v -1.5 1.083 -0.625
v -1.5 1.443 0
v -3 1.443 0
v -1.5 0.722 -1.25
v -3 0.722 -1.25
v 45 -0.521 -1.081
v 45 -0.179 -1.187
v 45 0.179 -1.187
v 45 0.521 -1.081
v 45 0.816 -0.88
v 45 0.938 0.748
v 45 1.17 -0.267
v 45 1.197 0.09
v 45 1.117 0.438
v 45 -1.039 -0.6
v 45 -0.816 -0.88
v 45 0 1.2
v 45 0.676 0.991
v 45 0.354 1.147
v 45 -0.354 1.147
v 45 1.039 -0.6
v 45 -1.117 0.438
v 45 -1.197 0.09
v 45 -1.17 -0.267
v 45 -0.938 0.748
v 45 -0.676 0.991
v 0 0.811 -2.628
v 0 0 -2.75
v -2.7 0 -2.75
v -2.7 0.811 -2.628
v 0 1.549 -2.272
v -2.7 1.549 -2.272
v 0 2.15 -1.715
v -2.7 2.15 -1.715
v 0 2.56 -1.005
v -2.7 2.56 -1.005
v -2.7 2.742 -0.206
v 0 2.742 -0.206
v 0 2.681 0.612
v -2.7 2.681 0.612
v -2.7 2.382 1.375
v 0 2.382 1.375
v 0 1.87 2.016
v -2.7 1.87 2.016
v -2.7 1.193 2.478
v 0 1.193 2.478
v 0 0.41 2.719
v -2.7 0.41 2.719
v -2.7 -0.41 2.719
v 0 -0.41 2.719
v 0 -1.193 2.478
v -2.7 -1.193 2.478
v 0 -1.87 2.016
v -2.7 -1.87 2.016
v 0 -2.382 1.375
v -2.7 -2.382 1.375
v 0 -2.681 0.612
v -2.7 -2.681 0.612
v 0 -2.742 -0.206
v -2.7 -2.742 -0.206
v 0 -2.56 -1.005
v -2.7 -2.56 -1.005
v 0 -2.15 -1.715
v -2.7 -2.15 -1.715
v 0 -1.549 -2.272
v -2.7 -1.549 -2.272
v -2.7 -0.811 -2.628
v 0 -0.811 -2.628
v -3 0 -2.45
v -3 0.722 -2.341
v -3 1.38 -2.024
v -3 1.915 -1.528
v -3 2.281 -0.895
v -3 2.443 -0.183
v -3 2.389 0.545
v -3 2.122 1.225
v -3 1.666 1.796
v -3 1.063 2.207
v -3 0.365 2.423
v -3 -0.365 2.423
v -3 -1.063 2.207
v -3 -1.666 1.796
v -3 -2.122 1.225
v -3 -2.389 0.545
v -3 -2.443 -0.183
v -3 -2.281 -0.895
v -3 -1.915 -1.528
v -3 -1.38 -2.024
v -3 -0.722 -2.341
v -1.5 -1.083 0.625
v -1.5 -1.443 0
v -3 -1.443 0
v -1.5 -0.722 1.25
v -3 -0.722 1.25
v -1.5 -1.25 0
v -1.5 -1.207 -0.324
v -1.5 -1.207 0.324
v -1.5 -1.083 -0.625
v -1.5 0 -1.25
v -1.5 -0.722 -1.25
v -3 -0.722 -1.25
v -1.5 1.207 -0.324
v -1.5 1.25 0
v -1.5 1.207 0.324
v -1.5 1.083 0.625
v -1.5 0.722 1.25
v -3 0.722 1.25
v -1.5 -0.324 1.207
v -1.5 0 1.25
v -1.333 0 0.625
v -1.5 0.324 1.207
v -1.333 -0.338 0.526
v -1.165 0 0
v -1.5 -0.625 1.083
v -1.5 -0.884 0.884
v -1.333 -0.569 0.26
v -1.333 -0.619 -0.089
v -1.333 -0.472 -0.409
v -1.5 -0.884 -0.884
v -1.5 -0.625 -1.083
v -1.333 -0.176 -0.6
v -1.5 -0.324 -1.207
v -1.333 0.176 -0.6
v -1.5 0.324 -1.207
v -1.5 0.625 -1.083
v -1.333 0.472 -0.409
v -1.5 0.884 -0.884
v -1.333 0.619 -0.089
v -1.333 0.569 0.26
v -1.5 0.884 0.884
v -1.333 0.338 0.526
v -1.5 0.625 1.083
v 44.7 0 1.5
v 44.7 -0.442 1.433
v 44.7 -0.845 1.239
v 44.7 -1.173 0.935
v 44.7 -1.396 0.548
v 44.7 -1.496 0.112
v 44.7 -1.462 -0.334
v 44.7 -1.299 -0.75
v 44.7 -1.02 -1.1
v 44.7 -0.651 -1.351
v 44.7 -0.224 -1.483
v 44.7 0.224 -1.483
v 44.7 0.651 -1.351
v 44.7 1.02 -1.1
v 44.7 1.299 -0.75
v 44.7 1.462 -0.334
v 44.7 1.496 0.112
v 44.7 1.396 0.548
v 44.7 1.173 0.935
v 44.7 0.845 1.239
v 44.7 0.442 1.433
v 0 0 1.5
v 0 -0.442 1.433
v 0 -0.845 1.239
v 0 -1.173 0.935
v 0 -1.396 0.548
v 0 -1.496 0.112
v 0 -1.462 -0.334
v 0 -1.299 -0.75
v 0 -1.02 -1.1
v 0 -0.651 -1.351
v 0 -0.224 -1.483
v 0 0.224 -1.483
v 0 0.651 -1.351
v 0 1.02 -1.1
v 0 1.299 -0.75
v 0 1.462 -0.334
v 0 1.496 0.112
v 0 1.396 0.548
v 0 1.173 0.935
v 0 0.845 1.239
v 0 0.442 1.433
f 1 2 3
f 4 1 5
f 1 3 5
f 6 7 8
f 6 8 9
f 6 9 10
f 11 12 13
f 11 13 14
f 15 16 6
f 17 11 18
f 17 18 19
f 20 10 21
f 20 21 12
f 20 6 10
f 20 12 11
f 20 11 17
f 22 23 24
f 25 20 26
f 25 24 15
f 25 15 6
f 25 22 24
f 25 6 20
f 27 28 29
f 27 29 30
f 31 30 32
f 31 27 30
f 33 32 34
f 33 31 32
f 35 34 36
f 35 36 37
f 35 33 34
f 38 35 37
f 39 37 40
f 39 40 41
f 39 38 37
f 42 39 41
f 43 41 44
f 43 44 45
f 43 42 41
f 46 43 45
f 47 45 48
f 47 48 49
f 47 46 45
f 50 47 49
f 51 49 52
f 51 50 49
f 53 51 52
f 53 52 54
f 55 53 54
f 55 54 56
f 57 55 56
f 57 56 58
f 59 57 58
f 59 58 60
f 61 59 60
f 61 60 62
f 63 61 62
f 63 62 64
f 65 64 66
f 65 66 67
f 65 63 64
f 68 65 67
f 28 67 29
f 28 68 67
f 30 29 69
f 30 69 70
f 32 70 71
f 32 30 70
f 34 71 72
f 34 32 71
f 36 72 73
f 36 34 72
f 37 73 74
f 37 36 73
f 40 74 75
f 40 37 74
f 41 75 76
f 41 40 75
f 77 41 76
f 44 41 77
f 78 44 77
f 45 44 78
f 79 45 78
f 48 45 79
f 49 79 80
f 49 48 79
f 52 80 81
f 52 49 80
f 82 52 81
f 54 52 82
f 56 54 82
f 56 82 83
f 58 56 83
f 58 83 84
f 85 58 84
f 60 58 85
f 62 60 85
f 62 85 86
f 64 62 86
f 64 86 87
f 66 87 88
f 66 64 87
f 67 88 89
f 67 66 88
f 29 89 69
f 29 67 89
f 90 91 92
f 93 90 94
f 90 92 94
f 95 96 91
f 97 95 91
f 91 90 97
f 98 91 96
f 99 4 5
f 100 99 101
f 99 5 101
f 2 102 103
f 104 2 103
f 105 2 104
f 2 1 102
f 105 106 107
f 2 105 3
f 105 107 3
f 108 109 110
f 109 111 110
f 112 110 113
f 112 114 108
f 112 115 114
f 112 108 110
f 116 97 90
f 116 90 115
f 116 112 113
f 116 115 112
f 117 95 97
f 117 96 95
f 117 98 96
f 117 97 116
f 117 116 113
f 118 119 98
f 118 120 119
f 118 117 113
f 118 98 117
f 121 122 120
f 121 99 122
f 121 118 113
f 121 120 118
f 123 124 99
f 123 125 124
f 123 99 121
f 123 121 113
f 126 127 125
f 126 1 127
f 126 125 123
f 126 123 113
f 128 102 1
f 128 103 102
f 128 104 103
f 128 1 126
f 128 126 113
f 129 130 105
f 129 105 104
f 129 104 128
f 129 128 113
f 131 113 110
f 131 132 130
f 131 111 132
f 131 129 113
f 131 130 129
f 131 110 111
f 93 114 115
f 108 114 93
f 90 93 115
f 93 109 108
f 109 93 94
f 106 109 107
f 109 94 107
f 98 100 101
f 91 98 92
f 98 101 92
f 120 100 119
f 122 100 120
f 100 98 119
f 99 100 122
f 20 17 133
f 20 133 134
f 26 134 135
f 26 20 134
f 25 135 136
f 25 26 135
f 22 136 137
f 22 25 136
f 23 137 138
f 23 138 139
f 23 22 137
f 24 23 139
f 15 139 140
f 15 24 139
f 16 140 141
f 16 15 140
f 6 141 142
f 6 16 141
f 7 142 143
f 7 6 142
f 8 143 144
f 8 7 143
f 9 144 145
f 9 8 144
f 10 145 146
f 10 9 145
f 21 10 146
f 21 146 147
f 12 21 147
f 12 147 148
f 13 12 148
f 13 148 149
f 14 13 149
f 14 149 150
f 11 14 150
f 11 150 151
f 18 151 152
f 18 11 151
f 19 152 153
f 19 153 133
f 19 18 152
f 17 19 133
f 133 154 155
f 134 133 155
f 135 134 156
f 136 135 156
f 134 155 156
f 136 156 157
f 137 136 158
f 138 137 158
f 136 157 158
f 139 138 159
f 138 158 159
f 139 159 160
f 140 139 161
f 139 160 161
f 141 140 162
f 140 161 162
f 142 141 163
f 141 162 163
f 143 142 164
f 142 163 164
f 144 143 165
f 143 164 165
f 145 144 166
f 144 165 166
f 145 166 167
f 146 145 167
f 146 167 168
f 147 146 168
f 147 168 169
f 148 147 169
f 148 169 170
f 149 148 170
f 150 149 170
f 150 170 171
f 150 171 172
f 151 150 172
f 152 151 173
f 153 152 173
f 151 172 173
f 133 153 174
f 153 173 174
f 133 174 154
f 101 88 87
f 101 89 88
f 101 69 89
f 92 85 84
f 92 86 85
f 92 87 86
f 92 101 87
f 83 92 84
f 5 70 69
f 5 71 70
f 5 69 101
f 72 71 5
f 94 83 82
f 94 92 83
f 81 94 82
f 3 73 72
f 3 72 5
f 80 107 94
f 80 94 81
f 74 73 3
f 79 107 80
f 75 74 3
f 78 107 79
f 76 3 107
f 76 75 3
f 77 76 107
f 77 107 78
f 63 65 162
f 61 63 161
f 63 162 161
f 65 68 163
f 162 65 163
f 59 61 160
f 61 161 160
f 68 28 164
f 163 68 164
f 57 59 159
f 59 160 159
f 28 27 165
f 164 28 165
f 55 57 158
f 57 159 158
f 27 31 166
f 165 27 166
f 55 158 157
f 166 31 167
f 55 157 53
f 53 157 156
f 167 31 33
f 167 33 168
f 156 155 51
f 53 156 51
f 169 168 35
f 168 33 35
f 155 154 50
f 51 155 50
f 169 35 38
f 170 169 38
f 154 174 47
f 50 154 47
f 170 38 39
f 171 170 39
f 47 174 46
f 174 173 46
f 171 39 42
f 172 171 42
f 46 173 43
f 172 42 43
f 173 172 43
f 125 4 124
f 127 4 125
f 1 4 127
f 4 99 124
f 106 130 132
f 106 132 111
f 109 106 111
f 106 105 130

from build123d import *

# Parameters (mm, degrees)
SKETCH1_W           = 3
SKETCH1_H           = 2.75
SKETCH2_R           = 1.5
BOSS_EXTRUDE1_DEPTH = 45
CUT_EXTRUDE1_DEPTH  = 1.5
CHAMFER1_SIZE       = 0.3


with BuildPart() as part:
    # Sketch1 → Revolve1 (revolve)
    with BuildSketch(Plane.XY, mode=Mode.PRIVATE) as revolve1_sk:
        with Locations((-1.5, 1.375)):
            Rectangle(SKETCH1_W, SKETCH1_H)
    revolve(revolve1_sk.sketch.rotate(Axis((-3, 0, 0), (1, 0, 0)), 270), axis=Axis((-3, 0, 0), (1, 0, 0)))

    # Sketch2 → Boss-Extrude1 (add)
    with BuildSketch(Plane(origin=(0, 0, 0), x_dir=(0, 0, -1), z_dir=(1, 0, 0))):
        with Locations(Location((0, 0, 0), (0, 0, 180))):
            Circle(SKETCH2_R)
    extrude(amount=BOSS_EXTRUDE1_DEPTH)

    # Sketch3 → Cut-Extrude1 (cut)
    with BuildSketch(Plane.ZY.offset(3)):
        Polygon((1.25, -0.721687836), (1.25, 0.721687836), (0, 1.443375673), (-1.25, 0.721687836), (-1.25, -0.721687836), (0, -1.443375673), align=None)
    extrude(amount=-CUT_EXTRUDE1_DEPTH, mode=Mode.SUBTRACT)

    # Sketch4 → Cut-Revolve1 (revolve, cut)
    with BuildSketch(Plane.XY, mode=Mode.PRIVATE) as cut_revolve1_sk:
        Polygon((-1.5, 1.25), (-1.5, 0), (-1.165063509, 0), align=None)
    revolve(cut_revolve1_sk.sketch.rotate(Axis((-1.500025, 0, 0), (1, 0, 0)), 90), axis=Axis((-1.500025, 0, 0), (1, 0, 0)), mode=Mode.SUBTRACT)

    # Chamfer1
    chamfer1_edges = [part.edges().sort_by_distance(p)[0] for p in [
        (-3, 0, 2.75),
        (45, 0, -1.5),
    ]]
    chamfer(chamfer1_edges, length=CHAMFER1_SIZE)


solid = part.part
